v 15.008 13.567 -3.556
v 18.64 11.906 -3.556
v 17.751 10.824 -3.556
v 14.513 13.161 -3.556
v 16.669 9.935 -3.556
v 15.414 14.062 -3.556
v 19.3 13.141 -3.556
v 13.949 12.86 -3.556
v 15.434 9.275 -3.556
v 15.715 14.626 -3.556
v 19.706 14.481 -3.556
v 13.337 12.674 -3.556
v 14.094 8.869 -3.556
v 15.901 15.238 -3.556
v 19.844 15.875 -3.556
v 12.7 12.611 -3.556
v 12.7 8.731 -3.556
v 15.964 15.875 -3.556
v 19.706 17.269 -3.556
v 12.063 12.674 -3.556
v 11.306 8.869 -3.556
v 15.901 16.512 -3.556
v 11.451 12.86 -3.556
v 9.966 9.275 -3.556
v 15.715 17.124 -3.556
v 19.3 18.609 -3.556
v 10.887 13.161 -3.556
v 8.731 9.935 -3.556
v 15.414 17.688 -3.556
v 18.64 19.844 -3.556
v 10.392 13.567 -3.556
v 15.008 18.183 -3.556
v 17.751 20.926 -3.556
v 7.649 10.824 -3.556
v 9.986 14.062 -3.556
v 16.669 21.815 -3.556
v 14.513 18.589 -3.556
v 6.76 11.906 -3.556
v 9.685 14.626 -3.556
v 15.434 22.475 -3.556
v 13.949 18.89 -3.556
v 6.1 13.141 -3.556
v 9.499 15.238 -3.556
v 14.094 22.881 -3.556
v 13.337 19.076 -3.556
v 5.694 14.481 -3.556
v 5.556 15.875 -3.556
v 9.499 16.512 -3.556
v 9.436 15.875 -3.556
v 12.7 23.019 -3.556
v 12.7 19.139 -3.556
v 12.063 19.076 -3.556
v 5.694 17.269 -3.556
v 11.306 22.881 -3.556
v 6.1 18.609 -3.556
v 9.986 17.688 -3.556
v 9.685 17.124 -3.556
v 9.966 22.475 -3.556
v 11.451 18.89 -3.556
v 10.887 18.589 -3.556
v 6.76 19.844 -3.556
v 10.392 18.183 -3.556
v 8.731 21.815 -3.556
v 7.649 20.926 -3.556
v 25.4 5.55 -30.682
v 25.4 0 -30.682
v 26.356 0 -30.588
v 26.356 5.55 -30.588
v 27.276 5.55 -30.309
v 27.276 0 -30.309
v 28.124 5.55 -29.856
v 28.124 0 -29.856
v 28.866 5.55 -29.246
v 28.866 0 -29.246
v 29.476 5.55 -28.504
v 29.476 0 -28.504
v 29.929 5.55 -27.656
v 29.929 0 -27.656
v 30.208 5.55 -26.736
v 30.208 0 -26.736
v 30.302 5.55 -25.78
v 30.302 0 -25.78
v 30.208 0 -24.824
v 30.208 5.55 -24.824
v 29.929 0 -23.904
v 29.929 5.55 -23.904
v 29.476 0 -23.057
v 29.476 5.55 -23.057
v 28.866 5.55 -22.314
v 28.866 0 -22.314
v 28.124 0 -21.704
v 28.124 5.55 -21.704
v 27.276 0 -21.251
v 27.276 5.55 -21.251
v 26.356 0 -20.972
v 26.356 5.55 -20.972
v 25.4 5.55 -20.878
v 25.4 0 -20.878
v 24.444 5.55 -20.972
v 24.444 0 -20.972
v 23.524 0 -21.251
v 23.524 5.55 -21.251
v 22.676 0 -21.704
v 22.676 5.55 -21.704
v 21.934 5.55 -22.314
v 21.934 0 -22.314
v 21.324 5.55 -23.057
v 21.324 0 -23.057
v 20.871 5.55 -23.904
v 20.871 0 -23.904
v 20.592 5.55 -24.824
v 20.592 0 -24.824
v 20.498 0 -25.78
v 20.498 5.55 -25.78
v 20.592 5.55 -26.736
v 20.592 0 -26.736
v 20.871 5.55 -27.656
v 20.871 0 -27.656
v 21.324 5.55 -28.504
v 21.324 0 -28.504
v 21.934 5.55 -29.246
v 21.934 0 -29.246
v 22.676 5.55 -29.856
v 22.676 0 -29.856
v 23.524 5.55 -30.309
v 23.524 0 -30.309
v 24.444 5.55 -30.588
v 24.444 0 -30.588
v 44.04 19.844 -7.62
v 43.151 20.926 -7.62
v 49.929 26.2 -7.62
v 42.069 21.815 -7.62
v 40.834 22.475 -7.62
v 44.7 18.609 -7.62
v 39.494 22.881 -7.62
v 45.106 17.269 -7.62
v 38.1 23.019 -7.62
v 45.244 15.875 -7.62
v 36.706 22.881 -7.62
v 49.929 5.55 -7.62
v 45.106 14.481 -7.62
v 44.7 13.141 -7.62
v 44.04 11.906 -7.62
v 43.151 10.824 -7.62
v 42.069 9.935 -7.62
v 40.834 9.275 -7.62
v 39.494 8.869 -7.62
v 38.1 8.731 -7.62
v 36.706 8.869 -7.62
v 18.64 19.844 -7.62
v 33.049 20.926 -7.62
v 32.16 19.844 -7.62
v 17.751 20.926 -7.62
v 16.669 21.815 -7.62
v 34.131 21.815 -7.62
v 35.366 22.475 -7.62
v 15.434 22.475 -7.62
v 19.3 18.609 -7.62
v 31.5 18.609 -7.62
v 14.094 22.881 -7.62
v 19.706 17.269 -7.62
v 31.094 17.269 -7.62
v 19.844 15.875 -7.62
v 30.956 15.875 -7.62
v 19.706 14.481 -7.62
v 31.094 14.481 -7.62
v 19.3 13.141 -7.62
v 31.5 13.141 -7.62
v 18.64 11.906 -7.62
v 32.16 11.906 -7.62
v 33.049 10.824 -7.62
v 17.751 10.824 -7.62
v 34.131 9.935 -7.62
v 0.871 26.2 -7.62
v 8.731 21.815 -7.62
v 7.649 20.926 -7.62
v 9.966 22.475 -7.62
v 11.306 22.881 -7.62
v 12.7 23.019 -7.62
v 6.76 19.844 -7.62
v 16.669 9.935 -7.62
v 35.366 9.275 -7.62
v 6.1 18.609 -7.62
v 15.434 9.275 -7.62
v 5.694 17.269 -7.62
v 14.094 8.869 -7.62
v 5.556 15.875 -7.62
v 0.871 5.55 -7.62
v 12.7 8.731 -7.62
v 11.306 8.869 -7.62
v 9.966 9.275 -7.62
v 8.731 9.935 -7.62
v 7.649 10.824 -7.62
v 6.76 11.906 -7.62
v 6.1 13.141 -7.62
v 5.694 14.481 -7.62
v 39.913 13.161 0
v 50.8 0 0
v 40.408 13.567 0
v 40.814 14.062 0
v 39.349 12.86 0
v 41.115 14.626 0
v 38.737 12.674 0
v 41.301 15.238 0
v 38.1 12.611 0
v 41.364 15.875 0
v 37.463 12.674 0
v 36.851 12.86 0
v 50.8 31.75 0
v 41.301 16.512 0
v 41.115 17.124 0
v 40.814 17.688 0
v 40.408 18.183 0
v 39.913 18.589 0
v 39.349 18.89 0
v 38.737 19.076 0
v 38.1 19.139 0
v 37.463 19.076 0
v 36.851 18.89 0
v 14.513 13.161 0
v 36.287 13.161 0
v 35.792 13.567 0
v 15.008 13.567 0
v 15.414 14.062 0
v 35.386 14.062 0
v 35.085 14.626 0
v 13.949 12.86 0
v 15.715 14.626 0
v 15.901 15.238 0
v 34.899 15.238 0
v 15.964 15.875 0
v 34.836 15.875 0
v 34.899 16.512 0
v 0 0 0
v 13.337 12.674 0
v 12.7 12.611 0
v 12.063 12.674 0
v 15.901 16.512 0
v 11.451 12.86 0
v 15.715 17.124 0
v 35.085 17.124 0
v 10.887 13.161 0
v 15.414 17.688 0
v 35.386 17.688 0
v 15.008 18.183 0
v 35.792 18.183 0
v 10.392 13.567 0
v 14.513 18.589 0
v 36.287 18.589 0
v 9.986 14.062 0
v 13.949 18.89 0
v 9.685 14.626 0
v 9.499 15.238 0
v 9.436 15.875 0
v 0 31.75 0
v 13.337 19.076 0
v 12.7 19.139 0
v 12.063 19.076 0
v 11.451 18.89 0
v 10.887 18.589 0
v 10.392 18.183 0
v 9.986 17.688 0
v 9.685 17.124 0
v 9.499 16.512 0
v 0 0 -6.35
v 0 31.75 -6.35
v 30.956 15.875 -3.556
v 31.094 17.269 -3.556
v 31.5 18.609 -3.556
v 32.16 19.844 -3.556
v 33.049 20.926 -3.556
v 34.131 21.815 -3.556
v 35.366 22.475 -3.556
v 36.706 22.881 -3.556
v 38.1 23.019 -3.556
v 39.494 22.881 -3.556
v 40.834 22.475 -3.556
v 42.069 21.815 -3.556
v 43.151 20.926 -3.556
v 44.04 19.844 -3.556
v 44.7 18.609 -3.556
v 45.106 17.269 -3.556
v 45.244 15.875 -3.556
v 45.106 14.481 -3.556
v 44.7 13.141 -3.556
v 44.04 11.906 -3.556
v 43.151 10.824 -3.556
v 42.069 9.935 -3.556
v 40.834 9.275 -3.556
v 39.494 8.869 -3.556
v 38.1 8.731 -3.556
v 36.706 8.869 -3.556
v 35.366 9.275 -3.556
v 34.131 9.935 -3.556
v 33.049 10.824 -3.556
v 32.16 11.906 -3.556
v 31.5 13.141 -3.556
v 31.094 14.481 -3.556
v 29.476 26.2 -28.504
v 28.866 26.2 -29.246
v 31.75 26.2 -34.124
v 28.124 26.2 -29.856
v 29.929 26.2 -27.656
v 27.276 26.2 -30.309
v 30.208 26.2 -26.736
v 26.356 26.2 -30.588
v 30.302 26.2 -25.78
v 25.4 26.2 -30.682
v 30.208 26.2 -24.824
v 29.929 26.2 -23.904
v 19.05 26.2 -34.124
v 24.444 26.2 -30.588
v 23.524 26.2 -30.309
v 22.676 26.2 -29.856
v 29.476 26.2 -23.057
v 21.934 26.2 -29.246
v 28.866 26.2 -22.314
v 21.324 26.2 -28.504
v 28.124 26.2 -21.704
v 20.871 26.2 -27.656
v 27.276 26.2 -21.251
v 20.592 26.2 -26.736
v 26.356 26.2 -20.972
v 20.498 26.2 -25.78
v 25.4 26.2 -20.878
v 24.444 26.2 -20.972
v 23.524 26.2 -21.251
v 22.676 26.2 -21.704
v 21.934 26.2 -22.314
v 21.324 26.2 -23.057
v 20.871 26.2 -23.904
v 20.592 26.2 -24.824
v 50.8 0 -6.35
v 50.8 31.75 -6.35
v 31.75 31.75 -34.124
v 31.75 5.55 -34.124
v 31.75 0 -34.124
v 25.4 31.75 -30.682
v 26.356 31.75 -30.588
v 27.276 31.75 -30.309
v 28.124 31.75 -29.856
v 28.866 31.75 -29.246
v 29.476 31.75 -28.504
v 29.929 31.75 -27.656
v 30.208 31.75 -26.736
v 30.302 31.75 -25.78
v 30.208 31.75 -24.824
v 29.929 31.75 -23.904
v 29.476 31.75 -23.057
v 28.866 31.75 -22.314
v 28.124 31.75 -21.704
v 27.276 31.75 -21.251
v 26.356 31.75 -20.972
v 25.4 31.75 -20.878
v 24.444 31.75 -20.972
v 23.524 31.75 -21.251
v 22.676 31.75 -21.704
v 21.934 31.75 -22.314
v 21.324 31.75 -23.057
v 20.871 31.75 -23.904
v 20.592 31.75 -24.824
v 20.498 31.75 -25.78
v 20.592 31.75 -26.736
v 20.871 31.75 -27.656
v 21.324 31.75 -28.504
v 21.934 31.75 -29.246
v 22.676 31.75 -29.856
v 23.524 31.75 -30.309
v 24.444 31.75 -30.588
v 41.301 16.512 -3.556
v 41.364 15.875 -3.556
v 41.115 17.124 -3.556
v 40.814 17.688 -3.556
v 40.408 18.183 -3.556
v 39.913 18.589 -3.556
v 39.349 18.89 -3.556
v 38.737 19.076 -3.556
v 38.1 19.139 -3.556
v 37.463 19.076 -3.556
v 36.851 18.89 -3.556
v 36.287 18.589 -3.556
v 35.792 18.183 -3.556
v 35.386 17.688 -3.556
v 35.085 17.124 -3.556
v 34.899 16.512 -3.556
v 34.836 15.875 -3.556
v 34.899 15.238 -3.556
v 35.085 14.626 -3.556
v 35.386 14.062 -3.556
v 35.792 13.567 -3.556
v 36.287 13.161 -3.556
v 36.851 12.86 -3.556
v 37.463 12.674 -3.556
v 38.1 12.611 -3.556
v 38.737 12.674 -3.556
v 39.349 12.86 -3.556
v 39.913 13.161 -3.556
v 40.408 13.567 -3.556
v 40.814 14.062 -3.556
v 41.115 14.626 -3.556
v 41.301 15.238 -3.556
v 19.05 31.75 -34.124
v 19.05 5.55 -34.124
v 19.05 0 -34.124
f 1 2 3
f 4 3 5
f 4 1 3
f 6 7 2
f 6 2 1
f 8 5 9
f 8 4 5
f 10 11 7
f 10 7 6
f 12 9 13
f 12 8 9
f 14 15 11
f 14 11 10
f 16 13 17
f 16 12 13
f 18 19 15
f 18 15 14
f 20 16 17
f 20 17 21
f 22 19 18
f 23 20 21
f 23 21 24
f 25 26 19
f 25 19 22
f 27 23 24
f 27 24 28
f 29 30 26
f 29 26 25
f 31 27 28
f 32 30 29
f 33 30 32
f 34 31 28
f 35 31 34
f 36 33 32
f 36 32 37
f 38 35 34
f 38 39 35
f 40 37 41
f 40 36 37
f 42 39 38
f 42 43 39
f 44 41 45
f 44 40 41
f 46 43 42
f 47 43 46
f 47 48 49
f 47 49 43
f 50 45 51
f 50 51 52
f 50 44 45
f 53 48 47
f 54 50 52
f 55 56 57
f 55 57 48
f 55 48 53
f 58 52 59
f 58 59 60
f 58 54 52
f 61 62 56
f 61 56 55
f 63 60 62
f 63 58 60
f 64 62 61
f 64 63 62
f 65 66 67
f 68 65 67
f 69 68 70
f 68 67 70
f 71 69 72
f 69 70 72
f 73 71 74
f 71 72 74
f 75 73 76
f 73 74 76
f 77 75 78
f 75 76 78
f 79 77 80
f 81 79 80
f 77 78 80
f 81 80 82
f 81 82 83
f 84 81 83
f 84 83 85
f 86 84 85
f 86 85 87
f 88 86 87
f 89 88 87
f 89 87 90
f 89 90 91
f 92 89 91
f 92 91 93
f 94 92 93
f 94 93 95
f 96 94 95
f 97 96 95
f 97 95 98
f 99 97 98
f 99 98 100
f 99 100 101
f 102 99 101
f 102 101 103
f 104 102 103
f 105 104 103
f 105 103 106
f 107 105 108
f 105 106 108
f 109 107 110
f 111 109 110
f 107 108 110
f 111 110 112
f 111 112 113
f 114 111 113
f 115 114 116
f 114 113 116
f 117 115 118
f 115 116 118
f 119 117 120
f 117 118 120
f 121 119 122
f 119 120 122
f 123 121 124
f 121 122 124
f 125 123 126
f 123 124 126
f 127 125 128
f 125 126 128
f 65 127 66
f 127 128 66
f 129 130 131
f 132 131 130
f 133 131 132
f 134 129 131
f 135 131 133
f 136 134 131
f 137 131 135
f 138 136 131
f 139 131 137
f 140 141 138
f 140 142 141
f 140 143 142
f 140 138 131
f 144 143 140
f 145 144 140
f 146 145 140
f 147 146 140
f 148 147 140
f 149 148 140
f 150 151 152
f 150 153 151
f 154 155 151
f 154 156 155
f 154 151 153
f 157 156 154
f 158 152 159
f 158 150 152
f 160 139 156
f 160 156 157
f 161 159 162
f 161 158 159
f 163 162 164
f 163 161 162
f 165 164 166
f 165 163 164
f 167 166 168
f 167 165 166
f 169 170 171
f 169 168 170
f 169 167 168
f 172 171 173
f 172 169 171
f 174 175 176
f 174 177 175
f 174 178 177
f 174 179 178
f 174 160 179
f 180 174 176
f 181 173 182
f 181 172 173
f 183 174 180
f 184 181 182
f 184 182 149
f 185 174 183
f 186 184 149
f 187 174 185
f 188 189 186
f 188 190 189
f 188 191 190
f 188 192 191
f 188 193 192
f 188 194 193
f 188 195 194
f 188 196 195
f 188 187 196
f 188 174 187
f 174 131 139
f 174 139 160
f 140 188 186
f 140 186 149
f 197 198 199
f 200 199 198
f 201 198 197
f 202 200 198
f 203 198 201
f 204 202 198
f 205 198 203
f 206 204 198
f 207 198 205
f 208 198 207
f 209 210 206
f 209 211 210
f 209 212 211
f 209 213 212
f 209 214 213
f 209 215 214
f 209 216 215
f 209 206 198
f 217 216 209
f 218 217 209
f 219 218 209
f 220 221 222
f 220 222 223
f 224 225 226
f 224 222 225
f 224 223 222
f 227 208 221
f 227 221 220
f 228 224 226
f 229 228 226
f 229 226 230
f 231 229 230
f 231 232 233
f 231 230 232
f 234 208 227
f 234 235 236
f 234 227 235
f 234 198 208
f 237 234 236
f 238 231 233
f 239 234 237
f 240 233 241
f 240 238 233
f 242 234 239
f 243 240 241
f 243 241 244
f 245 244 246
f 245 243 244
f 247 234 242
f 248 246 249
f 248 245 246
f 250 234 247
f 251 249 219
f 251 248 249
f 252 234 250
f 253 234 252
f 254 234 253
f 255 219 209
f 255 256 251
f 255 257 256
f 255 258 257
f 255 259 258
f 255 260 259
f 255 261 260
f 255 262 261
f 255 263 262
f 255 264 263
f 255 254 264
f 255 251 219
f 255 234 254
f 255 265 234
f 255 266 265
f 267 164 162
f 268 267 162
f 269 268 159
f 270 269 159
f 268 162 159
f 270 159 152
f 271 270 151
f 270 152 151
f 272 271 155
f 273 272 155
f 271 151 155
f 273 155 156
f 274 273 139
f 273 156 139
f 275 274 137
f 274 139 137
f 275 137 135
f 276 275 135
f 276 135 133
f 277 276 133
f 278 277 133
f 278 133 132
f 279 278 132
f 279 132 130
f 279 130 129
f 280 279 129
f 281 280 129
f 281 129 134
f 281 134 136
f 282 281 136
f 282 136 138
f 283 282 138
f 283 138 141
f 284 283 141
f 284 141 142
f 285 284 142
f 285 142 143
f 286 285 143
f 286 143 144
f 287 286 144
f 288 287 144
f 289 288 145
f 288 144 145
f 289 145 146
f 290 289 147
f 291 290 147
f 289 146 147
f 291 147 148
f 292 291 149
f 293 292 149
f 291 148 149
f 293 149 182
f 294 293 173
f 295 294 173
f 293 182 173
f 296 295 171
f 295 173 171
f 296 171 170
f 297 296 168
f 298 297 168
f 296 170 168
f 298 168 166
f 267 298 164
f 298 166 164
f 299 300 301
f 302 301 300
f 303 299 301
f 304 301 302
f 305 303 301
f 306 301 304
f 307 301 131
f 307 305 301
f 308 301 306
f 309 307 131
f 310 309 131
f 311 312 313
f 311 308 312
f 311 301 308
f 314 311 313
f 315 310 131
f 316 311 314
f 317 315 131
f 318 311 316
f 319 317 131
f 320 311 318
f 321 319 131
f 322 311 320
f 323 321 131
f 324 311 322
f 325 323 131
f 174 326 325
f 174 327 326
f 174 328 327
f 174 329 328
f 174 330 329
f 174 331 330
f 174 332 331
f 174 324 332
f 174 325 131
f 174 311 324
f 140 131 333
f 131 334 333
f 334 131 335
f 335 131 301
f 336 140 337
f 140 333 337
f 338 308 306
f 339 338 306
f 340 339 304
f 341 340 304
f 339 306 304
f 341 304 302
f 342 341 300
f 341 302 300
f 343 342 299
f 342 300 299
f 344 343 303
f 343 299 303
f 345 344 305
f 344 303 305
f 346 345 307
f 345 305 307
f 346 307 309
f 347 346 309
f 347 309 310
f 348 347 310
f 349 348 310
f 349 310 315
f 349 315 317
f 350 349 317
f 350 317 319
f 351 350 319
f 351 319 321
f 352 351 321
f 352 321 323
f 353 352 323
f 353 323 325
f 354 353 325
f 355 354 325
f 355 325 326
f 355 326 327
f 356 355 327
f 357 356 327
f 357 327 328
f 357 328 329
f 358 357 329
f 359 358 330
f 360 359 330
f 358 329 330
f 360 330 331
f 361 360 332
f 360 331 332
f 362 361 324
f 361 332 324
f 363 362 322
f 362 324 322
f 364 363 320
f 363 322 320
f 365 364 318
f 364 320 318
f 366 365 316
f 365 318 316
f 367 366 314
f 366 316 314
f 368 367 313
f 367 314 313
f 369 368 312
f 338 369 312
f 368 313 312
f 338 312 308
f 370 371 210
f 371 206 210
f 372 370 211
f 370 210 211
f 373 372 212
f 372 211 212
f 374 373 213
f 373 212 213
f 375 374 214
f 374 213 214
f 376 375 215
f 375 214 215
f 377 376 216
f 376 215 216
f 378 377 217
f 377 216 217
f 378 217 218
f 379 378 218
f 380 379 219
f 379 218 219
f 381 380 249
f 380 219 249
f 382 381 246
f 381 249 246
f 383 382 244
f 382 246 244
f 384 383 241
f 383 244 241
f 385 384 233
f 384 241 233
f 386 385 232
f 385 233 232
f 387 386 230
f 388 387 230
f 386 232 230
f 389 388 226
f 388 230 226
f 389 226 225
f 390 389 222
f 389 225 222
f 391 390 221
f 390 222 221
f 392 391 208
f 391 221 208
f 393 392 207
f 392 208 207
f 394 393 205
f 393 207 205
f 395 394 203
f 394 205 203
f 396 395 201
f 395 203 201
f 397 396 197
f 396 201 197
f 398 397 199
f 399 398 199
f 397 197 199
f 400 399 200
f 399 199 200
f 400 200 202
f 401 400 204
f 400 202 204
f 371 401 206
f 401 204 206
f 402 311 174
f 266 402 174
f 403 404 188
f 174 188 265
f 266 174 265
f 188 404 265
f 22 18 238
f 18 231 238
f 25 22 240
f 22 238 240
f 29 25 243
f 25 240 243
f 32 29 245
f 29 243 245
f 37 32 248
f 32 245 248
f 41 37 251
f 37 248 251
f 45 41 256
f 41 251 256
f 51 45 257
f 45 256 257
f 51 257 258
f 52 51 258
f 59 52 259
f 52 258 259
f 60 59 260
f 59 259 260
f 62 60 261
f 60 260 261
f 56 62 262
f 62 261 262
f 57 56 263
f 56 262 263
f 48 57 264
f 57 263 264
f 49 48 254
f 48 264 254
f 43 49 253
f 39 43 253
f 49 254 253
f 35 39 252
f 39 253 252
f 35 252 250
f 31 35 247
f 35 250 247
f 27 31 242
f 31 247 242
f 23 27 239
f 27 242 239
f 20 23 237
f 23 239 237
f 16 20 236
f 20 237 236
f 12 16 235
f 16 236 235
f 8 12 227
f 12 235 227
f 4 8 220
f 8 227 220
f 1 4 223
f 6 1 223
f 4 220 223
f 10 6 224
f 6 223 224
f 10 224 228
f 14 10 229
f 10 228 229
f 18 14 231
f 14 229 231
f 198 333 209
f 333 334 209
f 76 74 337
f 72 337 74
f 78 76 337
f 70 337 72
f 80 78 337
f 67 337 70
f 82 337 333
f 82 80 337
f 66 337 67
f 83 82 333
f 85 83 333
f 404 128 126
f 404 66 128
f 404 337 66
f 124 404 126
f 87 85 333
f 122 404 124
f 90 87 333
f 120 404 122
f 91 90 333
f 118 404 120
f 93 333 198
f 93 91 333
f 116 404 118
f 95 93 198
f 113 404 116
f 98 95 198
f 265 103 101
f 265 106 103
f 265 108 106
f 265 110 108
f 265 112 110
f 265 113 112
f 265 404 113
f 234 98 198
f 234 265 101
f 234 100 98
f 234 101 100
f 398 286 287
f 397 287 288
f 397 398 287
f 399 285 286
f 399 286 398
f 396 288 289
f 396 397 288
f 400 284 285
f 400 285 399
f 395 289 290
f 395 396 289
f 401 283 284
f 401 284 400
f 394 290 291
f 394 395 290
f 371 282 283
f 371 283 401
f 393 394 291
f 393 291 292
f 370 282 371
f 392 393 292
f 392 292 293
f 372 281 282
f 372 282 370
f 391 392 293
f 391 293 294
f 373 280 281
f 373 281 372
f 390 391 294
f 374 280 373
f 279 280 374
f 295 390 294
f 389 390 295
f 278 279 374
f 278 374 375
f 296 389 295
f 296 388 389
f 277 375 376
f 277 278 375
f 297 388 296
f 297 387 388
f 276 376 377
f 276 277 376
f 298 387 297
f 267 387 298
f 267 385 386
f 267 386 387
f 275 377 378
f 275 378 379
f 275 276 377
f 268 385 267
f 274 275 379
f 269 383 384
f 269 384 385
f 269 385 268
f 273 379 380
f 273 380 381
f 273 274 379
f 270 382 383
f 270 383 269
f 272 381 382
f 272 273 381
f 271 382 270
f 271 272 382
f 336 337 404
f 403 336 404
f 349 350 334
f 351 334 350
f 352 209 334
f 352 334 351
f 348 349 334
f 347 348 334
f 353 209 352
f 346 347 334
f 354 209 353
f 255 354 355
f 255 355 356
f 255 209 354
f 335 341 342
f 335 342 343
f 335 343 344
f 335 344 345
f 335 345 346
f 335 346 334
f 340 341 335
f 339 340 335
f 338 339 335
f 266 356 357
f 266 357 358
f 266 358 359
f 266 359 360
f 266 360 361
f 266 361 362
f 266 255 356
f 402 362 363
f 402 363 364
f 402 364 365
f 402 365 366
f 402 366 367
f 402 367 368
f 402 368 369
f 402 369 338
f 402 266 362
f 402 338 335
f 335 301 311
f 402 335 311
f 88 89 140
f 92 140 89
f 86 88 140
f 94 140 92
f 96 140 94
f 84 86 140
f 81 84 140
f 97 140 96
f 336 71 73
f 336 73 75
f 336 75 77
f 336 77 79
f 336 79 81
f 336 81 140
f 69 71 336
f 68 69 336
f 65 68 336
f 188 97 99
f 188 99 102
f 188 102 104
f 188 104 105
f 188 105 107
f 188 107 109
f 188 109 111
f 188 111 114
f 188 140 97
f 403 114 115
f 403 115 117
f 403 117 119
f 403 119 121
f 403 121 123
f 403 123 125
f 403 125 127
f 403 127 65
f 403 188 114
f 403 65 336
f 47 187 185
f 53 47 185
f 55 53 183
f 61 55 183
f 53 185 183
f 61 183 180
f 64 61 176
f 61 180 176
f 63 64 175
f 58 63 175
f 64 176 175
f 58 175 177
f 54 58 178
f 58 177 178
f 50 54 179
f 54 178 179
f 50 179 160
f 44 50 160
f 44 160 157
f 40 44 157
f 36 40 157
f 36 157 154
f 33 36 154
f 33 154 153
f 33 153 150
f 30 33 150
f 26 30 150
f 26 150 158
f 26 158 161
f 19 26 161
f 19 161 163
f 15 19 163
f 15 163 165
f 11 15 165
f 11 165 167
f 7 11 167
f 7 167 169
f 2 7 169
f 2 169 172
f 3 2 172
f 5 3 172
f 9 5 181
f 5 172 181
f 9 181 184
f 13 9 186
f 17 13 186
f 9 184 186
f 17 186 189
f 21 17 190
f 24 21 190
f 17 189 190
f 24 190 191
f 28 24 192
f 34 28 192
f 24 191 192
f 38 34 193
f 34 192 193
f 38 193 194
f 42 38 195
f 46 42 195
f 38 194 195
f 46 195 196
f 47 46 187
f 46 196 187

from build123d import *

# Parameters (mm, degrees)
BOSS_EXTRUDE1_DEPTH                                  = 50.8
CBORE_FOR_1_4_BINDING_HEAD_MACHINE_SCREW_D           = 6.5278
CBORE_FOR_1_4_BINDING_HEAD_MACHINE_SCREW_CBORE_D     = 14.2875
CBORE_FOR_1_4_BINDING_HEAD_MACHINE_SCREW_CBORE_DEPTH = 4.064
CUT_EXTRUDE1_REACH                                   = 73.2
SKETCH4_R                                            = 4.9022


with BuildPart() as part:
    # Sketch1 → Boss-Extrude1 (new body)
    with BuildSketch(Plane(origin=(0, 0, 0), x_dir=(0, 0, -1), z_dir=(1, 0, 0))):
        Polygon((0, 0), (0, 31.75), (38.480114202, 31.75), (38.480114202, 26.2001), (7.62, 26.2001), (7.62, 5.5499), (38.480114202, 5.5499), (38.480114202, 0), align=None)
    extrude(amount=BOSS_EXTRUDE1_DEPTH)

    # CBORE for 1/4 Binding Head Machine Screw1 (through all)
    with Locations(Plane(origin=(0, 0, -7.62), x_dir=(-1, 0, 0), z_dir=(0, 0, -1))):
        with Locations((-12.7, 15.875), (-38.1, 15.875)):
            CounterBoreHole(CBORE_FOR_1_4_BINDING_HEAD_MACHINE_SCREW_D / 2, CBORE_FOR_1_4_BINDING_HEAD_MACHINE_SCREW_CBORE_D / 2, CBORE_FOR_1_4_BINDING_HEAD_MACHINE_SCREW_CBORE_DEPTH)

    # Cut-Extrude1: up to this face of the body (flat: up to its plane)
    cut_extrude1_end = Plane(part.part.faces().sort_by_distance((25.4, 31.75, -19.240057101))[0])
    # Sketch4 → Cut-Extrude1 (cut, up to the picked face)
    with BuildSketch(Plane.XZ, mode=Mode.PRIVATE) as cut_extrude1_sk1:
        with Locations(Location((25.4, -25.780114202, 0), (0, 0, 270))):
            Circle(SKETCH4_R)
    cut_extrude1_tool1 = split(extrude(cut_extrude1_sk1.sketch, amount=-CUT_EXTRUDE1_REACH, mode=Mode.PRIVATE), bisect_by=cut_extrude1_end, keep=Keep.BOTH, mode=Mode.PRIVATE)
    # Sketch4 → Cut-Extrude1 (cut, up to the picked face)
    with BuildSketch(Plane.XZ, mode=Mode.PRIVATE) as cut_extrude1_sk2:
        Polygon((19.05, -34.124014202), (0, -6.35), (0, -38.480114202), (50.8, -38.480114202), (50.8, -6.35), (31.75, -34.124014202), align=None)
    cut_extrude1_tool2 = split(extrude(cut_extrude1_sk2.sketch, amount=-CUT_EXTRUDE1_REACH, mode=Mode.PRIVATE), bisect_by=cut_extrude1_end, keep=Keep.BOTH, mode=Mode.PRIVATE)
    add(cut_extrude1_tool1.solids().sort_by(Axis((25.4, 0, -25.780114), (0, 1, 0)))[0], mode=Mode.SUBTRACT)
    add(cut_extrude1_tool2.solids().sort_by(Axis((9.029312, 0, -20.576996), (0, 1, 0)))[0], mode=Mode.SUBTRACT)


solid = part.part
